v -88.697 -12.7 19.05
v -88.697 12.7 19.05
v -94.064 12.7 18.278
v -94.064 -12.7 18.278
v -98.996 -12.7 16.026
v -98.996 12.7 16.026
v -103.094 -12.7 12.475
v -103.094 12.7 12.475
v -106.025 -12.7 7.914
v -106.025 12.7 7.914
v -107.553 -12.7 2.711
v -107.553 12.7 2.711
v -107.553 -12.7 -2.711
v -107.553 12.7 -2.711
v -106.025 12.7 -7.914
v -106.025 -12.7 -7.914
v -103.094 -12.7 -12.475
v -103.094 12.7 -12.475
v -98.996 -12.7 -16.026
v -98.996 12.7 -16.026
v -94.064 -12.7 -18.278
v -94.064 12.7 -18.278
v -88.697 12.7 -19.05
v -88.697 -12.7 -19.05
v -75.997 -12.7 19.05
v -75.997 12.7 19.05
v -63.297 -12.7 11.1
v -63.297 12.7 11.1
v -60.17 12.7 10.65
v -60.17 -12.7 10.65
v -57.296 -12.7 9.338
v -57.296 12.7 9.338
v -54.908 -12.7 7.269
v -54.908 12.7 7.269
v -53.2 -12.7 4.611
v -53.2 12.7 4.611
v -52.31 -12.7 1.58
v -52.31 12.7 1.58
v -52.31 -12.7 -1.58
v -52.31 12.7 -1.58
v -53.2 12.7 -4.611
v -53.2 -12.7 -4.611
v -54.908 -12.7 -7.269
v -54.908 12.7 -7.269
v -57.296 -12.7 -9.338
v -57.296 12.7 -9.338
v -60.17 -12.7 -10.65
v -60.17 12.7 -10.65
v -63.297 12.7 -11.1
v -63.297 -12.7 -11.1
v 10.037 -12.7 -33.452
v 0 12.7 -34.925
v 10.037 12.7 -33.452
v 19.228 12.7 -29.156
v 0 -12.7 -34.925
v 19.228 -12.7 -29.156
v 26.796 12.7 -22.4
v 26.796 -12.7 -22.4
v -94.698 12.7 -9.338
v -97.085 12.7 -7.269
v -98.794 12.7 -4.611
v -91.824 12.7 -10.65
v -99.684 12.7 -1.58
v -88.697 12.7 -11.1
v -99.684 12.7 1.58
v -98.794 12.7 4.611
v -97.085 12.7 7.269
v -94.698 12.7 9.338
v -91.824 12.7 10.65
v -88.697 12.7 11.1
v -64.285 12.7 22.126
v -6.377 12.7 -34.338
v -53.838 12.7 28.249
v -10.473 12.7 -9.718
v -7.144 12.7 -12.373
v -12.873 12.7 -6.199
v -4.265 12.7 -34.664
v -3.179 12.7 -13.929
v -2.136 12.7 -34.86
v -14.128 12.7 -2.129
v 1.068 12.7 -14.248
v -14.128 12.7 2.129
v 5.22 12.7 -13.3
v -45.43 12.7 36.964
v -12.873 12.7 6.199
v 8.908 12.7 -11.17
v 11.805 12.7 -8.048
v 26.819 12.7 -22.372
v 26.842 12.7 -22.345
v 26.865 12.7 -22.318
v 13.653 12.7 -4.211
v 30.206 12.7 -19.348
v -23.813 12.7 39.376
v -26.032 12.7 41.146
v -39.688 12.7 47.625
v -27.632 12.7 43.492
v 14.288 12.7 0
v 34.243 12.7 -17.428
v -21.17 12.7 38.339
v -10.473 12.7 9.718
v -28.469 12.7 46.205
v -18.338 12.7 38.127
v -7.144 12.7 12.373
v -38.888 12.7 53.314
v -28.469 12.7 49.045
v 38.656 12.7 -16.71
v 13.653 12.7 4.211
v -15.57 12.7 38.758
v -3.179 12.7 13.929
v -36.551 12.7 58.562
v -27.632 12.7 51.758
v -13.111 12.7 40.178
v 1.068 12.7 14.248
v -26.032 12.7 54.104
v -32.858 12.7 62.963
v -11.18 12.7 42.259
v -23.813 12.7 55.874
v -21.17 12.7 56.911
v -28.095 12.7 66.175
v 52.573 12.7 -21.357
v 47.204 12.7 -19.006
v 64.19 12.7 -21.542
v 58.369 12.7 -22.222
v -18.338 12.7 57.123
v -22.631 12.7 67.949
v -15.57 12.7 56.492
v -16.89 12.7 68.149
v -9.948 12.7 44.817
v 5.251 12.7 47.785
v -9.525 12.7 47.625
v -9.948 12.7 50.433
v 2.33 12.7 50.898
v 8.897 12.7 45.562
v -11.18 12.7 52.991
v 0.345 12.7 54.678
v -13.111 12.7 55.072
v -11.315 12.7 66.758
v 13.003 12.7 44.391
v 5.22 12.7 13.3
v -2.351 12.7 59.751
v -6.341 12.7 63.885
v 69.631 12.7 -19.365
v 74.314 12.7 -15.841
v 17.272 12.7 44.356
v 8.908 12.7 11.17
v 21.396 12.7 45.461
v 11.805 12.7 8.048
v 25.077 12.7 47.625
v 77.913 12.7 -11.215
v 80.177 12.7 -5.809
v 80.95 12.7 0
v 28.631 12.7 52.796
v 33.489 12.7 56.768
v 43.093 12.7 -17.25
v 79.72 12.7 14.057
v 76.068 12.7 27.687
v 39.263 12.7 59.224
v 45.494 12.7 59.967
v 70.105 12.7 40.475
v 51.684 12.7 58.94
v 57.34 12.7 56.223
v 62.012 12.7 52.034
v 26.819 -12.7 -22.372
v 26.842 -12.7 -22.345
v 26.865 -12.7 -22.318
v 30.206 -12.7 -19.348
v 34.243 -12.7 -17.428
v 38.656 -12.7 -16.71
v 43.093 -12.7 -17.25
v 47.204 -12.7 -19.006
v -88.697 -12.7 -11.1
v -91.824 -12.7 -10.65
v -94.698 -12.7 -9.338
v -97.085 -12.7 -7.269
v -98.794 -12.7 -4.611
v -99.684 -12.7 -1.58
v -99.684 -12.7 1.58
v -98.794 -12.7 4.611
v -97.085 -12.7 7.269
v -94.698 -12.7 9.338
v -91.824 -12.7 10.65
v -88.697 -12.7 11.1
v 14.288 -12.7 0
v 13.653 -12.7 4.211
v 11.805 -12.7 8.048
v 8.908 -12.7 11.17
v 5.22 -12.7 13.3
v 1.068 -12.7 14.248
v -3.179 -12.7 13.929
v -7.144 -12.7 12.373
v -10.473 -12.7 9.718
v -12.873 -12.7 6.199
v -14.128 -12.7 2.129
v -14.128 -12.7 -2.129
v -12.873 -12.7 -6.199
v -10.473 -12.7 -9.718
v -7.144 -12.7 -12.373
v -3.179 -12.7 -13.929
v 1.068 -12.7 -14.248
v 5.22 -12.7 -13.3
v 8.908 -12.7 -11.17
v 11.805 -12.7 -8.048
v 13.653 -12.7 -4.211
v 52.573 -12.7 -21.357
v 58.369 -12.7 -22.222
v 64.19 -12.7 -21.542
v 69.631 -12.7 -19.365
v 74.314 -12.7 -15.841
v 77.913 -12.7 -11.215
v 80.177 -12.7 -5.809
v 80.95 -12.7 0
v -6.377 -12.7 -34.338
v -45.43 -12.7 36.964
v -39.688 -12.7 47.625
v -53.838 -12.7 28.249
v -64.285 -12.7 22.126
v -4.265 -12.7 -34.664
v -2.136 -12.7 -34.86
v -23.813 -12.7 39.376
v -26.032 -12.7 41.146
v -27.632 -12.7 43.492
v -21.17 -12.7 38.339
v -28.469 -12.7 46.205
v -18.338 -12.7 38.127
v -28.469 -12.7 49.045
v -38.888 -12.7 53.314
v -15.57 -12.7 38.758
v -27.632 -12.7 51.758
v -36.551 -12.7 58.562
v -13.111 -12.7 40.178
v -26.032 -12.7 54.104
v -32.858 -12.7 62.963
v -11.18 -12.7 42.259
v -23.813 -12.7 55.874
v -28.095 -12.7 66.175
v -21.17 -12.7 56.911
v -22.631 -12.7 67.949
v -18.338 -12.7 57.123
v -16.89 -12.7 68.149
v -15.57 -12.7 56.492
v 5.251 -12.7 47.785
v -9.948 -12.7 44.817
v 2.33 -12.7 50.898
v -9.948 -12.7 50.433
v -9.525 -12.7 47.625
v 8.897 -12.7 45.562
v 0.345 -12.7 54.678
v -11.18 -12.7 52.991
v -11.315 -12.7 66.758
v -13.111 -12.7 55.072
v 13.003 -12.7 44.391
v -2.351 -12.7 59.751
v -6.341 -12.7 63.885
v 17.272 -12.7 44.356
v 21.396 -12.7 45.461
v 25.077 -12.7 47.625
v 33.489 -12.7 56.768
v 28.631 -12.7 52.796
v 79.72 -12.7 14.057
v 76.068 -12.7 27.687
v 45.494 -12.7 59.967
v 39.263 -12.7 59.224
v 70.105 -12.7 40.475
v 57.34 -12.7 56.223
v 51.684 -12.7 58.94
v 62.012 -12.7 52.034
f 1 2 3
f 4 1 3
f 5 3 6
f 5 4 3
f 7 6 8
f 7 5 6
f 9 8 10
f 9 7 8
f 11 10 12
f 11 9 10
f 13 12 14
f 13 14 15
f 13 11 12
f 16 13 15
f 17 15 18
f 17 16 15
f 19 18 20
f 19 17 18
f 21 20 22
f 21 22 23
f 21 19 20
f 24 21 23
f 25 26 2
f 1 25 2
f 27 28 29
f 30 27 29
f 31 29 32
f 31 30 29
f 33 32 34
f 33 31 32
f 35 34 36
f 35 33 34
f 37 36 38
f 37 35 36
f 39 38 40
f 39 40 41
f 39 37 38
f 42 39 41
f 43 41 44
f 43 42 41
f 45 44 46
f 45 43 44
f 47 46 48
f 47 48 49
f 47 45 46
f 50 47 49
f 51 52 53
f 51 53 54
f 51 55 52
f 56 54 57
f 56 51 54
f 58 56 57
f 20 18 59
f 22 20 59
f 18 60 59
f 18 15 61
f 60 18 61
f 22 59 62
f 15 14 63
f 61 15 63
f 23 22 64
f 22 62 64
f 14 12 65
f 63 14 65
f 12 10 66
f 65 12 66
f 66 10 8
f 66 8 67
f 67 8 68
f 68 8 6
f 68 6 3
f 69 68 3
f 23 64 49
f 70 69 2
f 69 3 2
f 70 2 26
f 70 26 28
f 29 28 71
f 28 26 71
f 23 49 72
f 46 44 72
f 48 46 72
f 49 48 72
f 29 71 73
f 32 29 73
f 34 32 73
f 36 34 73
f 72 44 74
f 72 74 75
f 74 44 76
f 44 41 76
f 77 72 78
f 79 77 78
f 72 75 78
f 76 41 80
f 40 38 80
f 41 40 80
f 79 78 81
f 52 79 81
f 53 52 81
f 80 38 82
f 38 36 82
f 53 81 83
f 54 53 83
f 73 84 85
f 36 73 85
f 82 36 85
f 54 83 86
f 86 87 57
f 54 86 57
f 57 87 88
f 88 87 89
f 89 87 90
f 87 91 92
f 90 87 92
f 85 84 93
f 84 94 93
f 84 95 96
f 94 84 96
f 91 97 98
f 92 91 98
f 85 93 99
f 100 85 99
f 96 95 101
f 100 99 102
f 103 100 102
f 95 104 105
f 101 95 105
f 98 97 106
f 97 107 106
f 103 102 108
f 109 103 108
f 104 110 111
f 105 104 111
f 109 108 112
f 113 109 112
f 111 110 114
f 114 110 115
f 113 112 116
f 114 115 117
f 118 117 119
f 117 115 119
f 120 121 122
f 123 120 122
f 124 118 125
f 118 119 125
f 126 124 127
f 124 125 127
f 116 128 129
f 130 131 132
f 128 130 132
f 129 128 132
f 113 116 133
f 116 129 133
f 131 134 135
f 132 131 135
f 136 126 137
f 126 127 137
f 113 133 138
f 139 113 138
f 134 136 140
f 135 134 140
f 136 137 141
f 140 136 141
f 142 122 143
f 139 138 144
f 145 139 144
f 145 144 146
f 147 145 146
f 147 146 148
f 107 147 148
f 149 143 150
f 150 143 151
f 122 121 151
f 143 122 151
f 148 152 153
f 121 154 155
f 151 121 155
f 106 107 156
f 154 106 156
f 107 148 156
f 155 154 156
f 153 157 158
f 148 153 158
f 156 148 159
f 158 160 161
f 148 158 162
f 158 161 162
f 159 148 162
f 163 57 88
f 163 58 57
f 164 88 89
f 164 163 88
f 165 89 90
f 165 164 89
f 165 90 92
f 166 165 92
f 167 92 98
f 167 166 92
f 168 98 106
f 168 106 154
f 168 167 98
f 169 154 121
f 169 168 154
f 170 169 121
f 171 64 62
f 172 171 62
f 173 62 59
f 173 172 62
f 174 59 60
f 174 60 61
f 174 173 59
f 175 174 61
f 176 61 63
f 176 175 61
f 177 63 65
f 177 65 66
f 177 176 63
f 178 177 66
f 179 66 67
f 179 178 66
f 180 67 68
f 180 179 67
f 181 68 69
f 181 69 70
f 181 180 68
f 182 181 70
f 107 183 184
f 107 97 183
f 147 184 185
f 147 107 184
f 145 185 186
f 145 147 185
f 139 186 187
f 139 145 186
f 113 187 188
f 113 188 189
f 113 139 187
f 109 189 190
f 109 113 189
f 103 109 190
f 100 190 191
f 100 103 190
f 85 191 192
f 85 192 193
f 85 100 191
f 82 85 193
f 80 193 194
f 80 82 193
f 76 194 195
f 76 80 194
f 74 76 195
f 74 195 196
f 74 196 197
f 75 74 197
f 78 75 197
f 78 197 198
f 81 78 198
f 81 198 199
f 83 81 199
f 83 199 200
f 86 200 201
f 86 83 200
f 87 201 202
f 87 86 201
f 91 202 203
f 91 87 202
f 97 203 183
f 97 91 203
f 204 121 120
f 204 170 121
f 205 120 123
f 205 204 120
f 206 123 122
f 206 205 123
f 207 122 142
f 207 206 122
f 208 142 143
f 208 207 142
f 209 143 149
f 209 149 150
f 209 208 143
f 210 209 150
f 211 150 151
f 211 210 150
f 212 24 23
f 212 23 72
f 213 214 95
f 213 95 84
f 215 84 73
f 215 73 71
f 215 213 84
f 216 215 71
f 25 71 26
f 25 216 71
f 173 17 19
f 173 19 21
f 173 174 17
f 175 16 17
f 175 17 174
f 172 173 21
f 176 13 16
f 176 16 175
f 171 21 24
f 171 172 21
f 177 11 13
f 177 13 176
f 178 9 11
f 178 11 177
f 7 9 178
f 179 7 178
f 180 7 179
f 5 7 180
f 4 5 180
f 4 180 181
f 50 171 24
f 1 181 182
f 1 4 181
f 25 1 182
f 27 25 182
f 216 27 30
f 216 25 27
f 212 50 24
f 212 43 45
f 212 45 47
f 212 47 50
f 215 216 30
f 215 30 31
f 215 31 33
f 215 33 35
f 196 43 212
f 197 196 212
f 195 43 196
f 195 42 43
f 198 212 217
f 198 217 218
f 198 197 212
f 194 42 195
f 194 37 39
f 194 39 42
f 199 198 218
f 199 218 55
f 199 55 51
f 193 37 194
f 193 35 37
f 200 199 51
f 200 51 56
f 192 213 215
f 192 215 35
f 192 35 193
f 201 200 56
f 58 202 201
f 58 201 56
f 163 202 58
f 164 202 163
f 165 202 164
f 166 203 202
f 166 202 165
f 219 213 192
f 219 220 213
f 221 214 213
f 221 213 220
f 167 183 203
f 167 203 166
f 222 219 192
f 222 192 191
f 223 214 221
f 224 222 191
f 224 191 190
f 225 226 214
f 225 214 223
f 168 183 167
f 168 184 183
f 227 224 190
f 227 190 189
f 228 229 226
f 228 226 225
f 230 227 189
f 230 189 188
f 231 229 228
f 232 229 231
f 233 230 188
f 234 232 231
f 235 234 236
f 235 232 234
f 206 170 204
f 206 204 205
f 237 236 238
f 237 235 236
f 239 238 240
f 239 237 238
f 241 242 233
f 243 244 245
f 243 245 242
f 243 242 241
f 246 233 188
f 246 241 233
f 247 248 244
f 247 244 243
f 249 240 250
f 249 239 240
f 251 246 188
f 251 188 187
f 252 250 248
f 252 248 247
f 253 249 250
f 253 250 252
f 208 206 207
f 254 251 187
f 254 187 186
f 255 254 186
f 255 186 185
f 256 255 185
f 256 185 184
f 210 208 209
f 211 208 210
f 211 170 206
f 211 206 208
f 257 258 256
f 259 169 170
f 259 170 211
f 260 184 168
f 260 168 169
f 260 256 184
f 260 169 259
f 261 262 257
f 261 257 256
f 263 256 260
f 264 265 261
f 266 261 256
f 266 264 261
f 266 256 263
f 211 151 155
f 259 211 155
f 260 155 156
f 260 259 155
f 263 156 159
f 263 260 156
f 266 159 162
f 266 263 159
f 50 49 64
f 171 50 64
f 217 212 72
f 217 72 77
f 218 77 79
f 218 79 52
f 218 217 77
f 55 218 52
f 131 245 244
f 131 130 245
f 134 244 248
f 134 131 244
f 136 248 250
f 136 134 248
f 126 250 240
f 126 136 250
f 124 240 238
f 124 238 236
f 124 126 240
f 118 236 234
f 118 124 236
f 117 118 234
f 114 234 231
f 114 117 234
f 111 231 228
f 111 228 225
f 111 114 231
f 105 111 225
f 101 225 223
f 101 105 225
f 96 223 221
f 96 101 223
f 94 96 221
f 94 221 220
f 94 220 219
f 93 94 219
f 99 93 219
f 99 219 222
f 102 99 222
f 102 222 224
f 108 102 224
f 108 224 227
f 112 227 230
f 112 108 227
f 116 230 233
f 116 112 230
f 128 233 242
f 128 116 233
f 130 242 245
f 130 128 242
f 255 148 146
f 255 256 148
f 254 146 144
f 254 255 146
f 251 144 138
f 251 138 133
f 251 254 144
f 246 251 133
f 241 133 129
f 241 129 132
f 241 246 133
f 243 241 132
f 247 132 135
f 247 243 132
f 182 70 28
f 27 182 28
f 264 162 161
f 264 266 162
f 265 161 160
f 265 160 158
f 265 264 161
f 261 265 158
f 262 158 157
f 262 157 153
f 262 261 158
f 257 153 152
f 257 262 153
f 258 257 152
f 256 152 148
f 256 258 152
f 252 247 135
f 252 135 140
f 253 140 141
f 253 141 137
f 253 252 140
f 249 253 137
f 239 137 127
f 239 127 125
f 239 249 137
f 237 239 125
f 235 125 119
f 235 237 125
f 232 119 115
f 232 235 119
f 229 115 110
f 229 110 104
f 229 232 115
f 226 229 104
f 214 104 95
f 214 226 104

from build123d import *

# Parameters (mm, degrees)
F0_R     = 22.225
F0_R_2   = 14.2875
F0_R_3   = 9.525
F1_DEPTH = 12.7


# Not quite as in the source:
# - the program builds the solid bodies; features that only make, move or delete a surface that nothing else refers to are left out


with BuildPart() as f1:
    # F0 (on Front) → F1 (new body, symmetric)
    with BuildSketch(Plane.XZ):
        with BuildLine():
            ThreePointArc((0.3447838863, 54.6782803896), (1.274446594, 51.2059603319), (1.5875, 47.625))
            ThreePointArc((1.5875, 47.625), (-19.05, 26.9875), (-39.6875, 47.625))
            ThreePointArc((-39.6875, 47.625), (-53.8375681408, 28.2490113175), (-75.9968, 19.05))
            Line((-75.9968, 19.05), (-63.2968, 19.05))
            ThreePointArc((-63.2968, 19.05), (-44.2468, 0), (-63.2968, -19.05))
            Line((-63.2968, -19.05), (-88.6968, -19.05))
            Line((-88.6968, -19.05), (-6.3772739602, -34.3378468245))
            ThreePointArc((-6.3772739602, -34.3378468245), (-3.2021232024, -34.7779019434), (0, -34.925))
            ThreePointArc((0, -34.925), (14.789161423, -31.6391581652), (26.7955113754, -22.3999150697))
            ThreePointArc((26.7955113754, -22.3999150697), (26.830059594, -22.3587292729), (26.8647470812, -22.3176607024))
            ThreePointArc((26.8647470812, -22.3176607024), (36.4241213525, -16.9130263167), (47.2042520761, -19.005988544))
            ThreePointArc((47.2042520761, -19.005988544), (69.6313679155, -19.3648496329), (80.9498, 0))
            ThreePointArc((80.9498, 0), (76.0683727679, 27.6867119276), (62.0118668229, 52.0341345797))
            ThreePointArc((62.0118668229, 52.0341345797), (42.3521205548, 59.8164947236), (25.0767563288, 47.625))
            ThreePointArc((25.0767563288, 47.625), (10.9100684584, 44.8375705557), (0.3447838863, 54.6782803896))
        make_face()
        Circle(F0_R, mode=Mode.SUBTRACT)
        with BuildLine():
            Line((-63.2968, 19.05), (-75.9968, 19.05))
            Line((-75.9968, 19.05), (-88.6968, 19.05))
            ThreePointArc((-88.6968, 19.05), (-107.7468, 0), (-88.6968, -19.05))
            Line((-88.6968, -19.05), (-63.2968, -19.05))
            ThreePointArc((-63.2968, -19.05), (-44.2468, 0), (-63.2968, 19.05))
        make_face()
        with BuildLine():
            ThreePointArc((-88.6968, -11.0998), (-99.7966, 0), (-88.6968, 11.0998))
            Line((-88.6968, 11.0998), (-63.2968, 11.0998))
            ThreePointArc((-63.2968, 11.0998), (-52.197, 0), (-63.2968, -11.0998))
            Line((-63.2968, -11.0998), (-88.6968, -11.0998))
        make_face(mode=Mode.SUBTRACT)
        Circle(F0_R)
        Circle(F0_R_2, mode=Mode.SUBTRACT)
        with BuildLine():
            ThreePointArc((-39.6875, 47.625), (-19.05, 26.9875), (1.5875, 47.625))
            ThreePointArc((1.5875, 47.625), (1.274446594, 51.2059603319), (0.3447838863, 54.6782803896))
            ThreePointArc((0.3447838863, 54.6782803896), (-22.6309603319, 67.949446594), (-39.6875, 47.625))
        make_face()
        with Locations((-19.05, 47.625)):
            Circle(F0_R_3, mode=Mode.SUBTRACT)
    extrude(amount=F1_DEPTH, both=True)


solid = f1.part
